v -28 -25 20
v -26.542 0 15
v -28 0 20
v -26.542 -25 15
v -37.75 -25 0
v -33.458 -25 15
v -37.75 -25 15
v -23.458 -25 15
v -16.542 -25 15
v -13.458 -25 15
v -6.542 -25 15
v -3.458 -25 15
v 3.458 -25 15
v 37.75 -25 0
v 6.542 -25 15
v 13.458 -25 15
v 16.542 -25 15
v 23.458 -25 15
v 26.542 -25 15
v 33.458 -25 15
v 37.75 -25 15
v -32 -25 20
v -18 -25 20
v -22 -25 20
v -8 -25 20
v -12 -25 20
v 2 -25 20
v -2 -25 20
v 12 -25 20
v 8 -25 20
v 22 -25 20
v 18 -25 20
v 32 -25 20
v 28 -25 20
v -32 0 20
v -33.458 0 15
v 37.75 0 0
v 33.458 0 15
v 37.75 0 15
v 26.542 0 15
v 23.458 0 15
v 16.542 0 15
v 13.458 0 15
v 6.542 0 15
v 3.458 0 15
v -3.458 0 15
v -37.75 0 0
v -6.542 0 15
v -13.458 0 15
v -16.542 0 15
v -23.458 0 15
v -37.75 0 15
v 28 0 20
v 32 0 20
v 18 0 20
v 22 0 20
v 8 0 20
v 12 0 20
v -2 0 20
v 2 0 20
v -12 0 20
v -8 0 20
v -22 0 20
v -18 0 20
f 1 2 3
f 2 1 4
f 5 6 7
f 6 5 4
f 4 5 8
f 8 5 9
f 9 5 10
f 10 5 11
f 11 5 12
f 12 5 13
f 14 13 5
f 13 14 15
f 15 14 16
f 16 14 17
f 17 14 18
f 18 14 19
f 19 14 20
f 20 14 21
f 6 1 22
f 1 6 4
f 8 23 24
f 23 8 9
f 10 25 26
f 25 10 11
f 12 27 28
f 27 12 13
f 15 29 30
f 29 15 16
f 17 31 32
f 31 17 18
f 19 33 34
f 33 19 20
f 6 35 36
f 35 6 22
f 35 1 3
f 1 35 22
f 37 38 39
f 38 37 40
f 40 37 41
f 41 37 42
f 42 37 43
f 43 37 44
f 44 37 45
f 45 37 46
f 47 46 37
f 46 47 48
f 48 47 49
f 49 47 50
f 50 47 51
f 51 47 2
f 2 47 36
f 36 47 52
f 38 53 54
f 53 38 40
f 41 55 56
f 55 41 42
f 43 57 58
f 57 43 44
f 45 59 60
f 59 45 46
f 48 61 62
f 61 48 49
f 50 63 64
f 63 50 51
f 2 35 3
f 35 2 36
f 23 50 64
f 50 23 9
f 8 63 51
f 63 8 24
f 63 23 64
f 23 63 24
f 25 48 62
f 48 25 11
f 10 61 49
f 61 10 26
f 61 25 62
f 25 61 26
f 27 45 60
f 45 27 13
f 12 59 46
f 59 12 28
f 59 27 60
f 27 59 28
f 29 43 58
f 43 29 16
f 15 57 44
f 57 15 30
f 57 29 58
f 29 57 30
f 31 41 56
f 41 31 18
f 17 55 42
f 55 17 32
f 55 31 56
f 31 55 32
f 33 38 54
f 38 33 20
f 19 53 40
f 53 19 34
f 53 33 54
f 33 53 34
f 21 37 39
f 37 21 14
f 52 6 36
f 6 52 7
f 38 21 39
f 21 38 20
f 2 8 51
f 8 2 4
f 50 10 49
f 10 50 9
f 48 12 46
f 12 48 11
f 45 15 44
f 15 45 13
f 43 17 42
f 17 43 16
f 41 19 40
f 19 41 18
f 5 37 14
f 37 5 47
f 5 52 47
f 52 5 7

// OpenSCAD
$fn = 32;

// ----------------------------------------------------------------------
// Toothed rack, 7 teeth
// 10 mm pitch, 5 mm teeth
// ----------------------------------------------------------------------

// --- parameters (mm) ---
bar_w = 25;    // bar width (Y)
bar_h = 15;    // bar height (Z)
teeth = 7;     // number of teeth
pitch = 10;    // tooth pitch
tooth_h = 5;   // tooth height above the bar
root_w = 7.5;  // tooth width at the root
crest_w = 4;   // tooth width at the crest

// --- derived feature positions (mm) ---
span = (teeth - 1) * pitch;  // = 60   distance between the outer teeth
bar_l = span + root_w + 8;   // = 75.5   bar length: teeth plus 4 mm at each end
tooth_x = -span / 2;         // = -30   X of the first tooth
height = bar_h + tooth_h;    // = 20   overall height
feature_centers = [
  [tooth_x + 0 * pitch, -bar_w / 2],
  [tooth_x + 1 * pitch, -bar_w / 2],
  [tooth_x + 2 * pitch, -bar_w / 2],
  [tooth_x + 3 * pitch, -bar_w / 2],
  [tooth_x + 4 * pitch, -bar_w / 2],
  [tooth_x + 5 * pitch, -bar_w / 2],
  [tooth_x + 6 * pitch, -bar_w / 2]
];   // tooth centre line, drives the tooth loop

// bar with a rack of teeth, one extruded trapezoium per centre
module rack_tooth() {
  linear_extrude(height = bar_w)
    polygon(points = [
      [0, 0],
      [root_w, 0],
      [root_w / 2 + crest_w / 2, tooth_h + 1],
      [root_w / 2 - crest_w / 2, tooth_h + 1]
    ]);
}

union() {
  translate([-bar_l / 2, -bar_w, 0]) cube([bar_l, bar_w, bar_h]);
  for (centre = feature_centers)
    translate([centre[0] - root_w / 2, 0, bar_h - 1]) rotate([90, 0, 0]) rack_tooth();
}
